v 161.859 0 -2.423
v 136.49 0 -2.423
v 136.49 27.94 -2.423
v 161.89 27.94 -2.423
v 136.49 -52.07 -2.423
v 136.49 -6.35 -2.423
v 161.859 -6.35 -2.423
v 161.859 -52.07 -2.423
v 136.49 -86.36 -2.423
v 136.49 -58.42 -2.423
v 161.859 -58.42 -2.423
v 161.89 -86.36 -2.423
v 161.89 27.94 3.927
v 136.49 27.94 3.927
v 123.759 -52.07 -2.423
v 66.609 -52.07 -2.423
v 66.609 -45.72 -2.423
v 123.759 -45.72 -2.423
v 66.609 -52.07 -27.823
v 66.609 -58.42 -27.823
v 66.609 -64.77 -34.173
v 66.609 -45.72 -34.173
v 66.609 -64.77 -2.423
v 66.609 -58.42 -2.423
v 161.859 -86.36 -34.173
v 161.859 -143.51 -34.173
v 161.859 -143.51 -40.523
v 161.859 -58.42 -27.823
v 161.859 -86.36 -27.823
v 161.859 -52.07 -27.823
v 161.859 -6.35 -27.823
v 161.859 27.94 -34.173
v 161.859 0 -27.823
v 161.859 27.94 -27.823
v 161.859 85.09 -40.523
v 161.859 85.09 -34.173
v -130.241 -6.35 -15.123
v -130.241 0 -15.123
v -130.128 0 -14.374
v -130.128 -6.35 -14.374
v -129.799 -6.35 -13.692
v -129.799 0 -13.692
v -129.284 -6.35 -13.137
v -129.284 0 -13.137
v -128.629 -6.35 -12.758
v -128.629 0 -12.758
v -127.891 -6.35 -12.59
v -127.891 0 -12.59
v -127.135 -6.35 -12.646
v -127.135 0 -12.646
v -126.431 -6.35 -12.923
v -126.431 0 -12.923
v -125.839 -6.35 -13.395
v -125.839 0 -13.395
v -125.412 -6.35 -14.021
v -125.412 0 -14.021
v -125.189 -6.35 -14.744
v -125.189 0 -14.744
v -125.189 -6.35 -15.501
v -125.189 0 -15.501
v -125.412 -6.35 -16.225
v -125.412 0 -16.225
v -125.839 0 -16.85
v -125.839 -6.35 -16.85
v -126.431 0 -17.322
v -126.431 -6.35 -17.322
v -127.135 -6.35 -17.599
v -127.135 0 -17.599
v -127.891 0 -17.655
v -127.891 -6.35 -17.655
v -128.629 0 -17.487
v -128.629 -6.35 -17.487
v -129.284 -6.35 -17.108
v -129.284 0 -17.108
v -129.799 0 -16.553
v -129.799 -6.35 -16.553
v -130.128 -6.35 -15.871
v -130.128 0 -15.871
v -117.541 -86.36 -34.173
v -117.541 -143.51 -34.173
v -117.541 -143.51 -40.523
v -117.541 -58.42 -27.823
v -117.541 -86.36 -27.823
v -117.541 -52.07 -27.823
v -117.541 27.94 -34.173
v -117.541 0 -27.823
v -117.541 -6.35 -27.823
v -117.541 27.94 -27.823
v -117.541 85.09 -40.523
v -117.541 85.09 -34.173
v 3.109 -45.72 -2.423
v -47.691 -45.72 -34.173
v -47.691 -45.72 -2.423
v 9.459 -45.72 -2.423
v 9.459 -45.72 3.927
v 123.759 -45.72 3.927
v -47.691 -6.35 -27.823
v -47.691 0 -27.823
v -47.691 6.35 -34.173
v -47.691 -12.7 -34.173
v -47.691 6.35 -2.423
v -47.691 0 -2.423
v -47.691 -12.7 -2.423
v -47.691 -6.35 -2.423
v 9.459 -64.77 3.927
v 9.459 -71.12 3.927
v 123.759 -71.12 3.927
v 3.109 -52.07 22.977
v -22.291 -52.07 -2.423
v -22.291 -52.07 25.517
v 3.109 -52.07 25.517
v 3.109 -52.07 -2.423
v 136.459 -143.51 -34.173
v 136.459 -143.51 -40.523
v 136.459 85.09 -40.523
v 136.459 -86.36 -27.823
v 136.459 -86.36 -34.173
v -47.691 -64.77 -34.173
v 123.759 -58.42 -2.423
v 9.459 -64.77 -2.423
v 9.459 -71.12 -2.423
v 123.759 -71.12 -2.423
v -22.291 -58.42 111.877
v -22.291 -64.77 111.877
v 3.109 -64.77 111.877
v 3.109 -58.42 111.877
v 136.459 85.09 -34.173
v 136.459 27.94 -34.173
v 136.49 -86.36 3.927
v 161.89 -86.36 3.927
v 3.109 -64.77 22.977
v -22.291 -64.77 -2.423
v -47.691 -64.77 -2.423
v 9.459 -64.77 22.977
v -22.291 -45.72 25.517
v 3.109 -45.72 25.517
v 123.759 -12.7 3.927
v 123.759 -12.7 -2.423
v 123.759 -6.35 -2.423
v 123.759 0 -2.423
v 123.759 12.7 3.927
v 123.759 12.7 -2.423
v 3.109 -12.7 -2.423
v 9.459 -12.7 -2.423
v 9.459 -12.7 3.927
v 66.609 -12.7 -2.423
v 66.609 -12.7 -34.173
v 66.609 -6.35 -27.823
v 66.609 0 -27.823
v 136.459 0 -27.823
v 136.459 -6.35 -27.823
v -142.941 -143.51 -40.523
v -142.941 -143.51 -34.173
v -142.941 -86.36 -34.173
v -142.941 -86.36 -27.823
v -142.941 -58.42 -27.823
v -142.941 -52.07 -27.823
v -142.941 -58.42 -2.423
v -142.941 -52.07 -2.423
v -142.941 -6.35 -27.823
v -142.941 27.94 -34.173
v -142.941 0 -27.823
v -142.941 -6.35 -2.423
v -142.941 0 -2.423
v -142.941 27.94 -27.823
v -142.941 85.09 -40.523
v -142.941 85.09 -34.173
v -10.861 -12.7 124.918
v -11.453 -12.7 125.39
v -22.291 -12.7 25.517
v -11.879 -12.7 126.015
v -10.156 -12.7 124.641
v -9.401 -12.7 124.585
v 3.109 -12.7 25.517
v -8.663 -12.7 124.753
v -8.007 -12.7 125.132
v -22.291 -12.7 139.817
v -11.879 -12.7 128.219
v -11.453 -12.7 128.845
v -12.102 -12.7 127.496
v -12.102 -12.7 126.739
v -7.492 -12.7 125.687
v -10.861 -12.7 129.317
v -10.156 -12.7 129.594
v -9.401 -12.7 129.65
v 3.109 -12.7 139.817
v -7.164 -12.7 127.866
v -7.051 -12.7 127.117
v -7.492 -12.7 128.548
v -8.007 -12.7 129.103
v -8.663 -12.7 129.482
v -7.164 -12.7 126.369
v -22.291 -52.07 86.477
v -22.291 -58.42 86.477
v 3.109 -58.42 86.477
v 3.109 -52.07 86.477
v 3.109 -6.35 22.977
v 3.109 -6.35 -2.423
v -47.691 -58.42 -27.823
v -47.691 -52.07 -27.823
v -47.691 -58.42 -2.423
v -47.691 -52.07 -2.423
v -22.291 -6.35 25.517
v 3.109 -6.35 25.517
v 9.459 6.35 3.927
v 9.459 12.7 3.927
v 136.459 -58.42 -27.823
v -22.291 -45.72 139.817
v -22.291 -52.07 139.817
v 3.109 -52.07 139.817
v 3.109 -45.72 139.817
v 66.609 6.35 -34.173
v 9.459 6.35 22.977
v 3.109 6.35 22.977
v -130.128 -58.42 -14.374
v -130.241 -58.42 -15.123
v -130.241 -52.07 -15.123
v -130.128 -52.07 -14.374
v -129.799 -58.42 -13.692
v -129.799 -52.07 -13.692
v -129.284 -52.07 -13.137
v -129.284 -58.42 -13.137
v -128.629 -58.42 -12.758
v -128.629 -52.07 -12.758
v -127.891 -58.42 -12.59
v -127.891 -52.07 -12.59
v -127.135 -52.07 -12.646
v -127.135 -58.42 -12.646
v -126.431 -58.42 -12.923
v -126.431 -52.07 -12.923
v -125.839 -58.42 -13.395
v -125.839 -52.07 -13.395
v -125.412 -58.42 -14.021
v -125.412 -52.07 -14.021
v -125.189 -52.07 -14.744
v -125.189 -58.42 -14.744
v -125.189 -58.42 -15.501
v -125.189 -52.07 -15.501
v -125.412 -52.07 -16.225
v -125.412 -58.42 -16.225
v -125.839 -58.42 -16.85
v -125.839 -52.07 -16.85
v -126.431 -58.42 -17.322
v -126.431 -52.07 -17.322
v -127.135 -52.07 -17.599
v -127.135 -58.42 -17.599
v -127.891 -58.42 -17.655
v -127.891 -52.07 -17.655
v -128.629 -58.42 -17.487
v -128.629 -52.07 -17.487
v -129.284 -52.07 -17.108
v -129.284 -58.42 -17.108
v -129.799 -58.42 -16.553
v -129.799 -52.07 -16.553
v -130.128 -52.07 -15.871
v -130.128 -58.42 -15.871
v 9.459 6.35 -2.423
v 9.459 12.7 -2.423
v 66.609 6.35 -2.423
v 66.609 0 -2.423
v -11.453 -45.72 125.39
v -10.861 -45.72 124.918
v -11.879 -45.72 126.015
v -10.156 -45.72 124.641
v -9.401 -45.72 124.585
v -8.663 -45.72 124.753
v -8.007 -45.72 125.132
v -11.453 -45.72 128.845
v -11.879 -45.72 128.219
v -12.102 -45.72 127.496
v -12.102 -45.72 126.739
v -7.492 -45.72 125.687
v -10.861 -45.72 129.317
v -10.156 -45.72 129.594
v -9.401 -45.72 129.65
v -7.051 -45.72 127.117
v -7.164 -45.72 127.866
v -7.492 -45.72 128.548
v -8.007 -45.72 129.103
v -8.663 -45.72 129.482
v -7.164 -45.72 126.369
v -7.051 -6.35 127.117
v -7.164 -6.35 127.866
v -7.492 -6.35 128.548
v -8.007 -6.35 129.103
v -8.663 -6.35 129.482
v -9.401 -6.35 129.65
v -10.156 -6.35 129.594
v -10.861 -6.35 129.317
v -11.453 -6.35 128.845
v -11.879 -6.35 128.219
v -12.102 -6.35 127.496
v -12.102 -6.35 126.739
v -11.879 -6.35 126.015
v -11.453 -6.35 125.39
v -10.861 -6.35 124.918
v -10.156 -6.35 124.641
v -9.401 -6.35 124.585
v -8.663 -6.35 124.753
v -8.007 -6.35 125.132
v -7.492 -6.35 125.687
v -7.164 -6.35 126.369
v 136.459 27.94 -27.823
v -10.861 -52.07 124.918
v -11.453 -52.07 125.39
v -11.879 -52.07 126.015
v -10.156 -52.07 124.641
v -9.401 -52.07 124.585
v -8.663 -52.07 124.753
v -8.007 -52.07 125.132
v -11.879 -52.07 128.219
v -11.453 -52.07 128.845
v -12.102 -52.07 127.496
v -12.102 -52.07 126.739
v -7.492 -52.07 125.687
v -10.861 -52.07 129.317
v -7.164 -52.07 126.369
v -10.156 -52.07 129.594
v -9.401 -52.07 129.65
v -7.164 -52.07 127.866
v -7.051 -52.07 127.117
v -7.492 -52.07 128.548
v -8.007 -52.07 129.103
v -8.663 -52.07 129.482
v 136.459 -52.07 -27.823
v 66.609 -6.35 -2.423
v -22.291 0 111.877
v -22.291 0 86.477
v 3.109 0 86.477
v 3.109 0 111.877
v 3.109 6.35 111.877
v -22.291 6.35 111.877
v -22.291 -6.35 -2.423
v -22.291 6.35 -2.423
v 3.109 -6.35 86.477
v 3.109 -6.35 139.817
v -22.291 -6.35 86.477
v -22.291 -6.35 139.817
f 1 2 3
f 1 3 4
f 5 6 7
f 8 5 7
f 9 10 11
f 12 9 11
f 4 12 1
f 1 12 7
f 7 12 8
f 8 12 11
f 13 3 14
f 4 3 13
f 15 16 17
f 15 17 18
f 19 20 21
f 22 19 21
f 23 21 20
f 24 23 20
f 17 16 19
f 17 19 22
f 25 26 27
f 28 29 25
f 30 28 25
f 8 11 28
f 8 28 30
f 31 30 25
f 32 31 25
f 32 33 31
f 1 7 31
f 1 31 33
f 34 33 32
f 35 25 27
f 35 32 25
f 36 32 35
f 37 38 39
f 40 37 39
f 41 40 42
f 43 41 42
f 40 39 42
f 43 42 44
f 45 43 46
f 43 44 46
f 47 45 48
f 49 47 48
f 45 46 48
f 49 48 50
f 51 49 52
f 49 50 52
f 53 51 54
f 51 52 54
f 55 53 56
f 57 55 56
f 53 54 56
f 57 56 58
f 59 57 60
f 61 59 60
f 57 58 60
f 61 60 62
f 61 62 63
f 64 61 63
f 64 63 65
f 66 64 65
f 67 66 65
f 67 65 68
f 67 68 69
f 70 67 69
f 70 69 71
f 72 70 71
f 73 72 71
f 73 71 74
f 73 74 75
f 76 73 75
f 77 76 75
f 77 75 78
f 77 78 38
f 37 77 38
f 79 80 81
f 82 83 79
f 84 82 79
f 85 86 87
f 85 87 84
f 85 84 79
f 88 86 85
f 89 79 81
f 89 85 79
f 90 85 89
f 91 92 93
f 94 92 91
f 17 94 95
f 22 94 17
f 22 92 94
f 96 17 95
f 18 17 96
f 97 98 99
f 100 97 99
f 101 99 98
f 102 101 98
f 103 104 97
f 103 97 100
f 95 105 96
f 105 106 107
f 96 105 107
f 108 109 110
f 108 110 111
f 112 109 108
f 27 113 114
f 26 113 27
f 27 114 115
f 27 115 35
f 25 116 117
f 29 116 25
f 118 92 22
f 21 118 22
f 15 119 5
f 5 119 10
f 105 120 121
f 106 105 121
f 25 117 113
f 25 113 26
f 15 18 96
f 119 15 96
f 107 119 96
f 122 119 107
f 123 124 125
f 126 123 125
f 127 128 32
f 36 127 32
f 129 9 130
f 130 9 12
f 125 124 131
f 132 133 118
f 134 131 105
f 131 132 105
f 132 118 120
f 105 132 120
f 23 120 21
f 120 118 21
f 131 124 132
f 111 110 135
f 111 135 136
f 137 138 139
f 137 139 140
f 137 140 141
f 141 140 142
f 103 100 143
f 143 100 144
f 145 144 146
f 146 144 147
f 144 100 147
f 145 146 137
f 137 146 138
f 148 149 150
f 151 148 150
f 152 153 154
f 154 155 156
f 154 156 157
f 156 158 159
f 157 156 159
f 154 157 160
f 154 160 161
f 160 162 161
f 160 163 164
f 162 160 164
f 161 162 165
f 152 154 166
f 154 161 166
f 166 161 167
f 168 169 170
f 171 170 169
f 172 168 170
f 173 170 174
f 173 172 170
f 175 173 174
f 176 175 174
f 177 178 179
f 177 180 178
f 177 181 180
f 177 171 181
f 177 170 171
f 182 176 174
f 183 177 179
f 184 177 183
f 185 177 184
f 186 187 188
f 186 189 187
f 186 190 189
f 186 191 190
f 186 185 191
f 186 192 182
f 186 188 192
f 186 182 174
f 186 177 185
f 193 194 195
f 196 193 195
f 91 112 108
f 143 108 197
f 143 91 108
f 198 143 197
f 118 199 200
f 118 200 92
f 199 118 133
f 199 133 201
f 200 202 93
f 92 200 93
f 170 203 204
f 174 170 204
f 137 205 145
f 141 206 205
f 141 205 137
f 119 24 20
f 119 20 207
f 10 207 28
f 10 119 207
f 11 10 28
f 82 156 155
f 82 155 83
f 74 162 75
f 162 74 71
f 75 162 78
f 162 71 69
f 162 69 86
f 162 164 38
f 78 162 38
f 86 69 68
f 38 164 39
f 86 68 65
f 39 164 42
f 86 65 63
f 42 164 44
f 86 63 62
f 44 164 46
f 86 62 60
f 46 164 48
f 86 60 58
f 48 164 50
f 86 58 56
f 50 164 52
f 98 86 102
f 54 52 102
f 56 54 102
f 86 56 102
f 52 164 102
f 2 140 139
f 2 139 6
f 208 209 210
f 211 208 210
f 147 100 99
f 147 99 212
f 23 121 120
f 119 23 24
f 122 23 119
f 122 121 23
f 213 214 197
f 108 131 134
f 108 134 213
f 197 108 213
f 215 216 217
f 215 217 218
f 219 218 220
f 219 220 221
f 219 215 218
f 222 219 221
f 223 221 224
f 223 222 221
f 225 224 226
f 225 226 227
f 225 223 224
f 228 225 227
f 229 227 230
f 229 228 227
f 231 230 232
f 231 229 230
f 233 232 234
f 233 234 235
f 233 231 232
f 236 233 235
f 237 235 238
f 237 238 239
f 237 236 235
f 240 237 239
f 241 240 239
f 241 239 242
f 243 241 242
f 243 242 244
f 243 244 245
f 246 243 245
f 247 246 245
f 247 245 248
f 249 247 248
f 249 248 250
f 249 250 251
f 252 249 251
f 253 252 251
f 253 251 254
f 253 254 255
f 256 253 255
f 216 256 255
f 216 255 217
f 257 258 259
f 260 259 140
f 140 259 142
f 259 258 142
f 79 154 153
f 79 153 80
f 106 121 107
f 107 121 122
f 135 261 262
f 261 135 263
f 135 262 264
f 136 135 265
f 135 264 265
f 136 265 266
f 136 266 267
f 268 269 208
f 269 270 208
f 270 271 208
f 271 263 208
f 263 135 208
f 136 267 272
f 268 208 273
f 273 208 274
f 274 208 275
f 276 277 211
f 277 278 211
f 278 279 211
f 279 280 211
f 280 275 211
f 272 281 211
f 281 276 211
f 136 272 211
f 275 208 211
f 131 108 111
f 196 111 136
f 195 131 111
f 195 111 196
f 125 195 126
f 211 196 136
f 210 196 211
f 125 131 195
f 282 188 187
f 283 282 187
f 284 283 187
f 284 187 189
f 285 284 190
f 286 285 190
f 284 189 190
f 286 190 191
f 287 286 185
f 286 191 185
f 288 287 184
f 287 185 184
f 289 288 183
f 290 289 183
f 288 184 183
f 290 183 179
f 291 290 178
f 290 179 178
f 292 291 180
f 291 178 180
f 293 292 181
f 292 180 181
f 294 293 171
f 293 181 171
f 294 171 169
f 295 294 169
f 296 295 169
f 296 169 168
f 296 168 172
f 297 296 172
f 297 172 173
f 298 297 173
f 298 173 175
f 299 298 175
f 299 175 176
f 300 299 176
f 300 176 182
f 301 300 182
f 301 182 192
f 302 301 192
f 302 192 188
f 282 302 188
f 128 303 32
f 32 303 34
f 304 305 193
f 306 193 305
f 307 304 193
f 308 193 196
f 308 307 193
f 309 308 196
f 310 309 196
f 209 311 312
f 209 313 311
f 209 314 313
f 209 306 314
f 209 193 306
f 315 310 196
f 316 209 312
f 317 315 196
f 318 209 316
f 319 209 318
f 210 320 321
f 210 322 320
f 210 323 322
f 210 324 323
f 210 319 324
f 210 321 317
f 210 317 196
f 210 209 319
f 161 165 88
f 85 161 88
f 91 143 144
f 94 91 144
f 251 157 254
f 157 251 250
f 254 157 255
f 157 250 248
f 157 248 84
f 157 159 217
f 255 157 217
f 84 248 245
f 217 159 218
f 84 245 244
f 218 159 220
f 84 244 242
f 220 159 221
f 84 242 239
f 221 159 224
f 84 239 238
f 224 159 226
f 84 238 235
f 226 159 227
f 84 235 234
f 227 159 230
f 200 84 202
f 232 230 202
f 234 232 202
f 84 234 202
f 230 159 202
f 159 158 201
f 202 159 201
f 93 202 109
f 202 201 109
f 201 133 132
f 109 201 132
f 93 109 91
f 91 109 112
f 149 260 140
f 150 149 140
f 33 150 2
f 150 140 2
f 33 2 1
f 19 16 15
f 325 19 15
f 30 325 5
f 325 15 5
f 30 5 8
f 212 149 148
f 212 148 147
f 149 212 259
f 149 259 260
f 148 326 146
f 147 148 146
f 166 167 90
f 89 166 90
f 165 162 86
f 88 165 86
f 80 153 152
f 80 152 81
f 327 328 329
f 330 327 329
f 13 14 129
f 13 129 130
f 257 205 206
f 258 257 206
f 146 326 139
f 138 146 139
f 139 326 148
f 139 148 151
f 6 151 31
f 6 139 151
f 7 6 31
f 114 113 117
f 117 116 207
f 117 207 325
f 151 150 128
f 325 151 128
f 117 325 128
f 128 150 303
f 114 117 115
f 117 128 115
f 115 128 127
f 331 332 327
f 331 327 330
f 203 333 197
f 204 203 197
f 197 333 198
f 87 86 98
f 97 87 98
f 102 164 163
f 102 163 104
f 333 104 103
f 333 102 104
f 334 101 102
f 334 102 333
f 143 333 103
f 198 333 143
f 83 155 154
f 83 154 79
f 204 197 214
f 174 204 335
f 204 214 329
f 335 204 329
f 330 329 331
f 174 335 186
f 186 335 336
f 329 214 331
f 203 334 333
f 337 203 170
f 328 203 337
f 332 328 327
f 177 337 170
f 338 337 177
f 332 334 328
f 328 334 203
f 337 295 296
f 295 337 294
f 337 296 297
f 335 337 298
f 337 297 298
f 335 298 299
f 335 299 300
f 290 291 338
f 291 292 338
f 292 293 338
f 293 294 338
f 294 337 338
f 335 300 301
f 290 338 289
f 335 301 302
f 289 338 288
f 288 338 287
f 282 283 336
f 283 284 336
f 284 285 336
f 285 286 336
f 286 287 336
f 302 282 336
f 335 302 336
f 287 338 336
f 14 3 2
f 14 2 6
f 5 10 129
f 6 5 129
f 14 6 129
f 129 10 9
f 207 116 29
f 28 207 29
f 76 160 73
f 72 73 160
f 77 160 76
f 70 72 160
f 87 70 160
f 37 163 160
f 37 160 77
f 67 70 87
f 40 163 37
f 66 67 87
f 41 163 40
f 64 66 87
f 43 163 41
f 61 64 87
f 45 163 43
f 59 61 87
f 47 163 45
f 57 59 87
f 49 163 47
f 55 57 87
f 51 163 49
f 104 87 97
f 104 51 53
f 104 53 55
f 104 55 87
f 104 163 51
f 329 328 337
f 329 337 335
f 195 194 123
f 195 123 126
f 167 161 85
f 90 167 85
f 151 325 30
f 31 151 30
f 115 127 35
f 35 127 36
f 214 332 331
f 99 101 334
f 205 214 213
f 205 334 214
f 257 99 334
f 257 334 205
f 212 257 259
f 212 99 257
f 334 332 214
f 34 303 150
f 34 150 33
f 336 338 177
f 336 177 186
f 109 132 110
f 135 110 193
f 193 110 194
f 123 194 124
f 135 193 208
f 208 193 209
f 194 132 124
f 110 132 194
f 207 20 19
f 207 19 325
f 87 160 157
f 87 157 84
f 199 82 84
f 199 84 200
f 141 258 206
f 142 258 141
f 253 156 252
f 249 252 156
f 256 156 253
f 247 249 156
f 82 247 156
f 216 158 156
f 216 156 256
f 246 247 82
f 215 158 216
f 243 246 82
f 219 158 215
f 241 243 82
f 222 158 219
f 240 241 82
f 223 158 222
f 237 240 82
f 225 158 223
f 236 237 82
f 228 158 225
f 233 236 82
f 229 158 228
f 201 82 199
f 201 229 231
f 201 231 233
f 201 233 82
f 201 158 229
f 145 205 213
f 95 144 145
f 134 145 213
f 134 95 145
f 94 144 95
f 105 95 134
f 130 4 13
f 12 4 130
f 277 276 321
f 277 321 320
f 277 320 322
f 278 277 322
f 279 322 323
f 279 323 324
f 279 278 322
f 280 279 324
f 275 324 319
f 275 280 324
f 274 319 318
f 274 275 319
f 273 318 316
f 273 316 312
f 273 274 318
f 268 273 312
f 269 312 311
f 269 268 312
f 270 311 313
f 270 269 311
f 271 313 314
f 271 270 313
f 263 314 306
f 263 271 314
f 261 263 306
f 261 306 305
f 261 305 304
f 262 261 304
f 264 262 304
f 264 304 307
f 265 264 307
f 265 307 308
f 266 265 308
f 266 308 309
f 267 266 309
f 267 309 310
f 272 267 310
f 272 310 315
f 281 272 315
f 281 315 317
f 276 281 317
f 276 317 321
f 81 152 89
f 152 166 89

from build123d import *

# Parameters (mm, degrees)
F0_W      = 304.8
F0_H      = 25.4
F1_DEPTH  = 6.35
F2_W      = 114.3
F2_H      = 25.4
F3_DEPTH  = 6.35
F4_W      = 114.3
F4_H      = 25.4
F5_DEPTH  = 6.35
F7_D      = 5.08
F8_W      = 114.3
F8_H      = 19.05
F9_DEPTH  = 6.35
F10_W     = 25.4
F10_H     = 57.15
F11_DEPTH = 6.35
F12_W     = 25.4
F12_H     = 114.3
F13_DEPTH = 6.35
F14_W     = 25.4
F14_H     = 57.15
F15_DEPTH = 6.35
F16_W     = 25.4
F16_H     = 114.3
F17_DEPTH = 6.35
F18_W     = 25.4
F18_H     = 57.15
F19_DEPTH = 6.35
F20_W     = 6.35
F20_H     = 57.15
F21_DEPTH = 25.4
F22_W     = 114.3
F22_H     = 25.4
F23_DEPTH = 6.35
F24_W     = 25.4
F24_H     = 6.35
F25_DEPTH = 88.9
F26_W     = 25.4
F26_H     = 6.35
F27_DEPTH = 114.3
F28_W     = 25.4
F28_H     = 114.3
F29_DEPTH = 6.35
F31_D     = 5.08


with BuildPart() as f1:
    # F0 (on Front) → F1 (new body)
    with BuildSketch(Plane.XZ):
        with Locations((9.459311, -15.122586)):
            Rectangle(F0_W, F0_H)
    extrude(amount=F1_DEPTH)

    # F2 (on face) → F3 (join)
    with BuildSketch(Plane.XZ.offset(6.35)):
        with Locations((9.459311, -15.122586)):
            Rectangle(F2_W, F2_H)
    extrude(amount=F3_DEPTH)

    # F4 (on face) → F5 (join)
    with BuildSketch(Plane(origin=(0, 0, 0), x_dir=(-1, 0, 0), z_dir=(0, 1, 0))):
        with Locations((-9.459311, -15.122586)):
            Rectangle(F4_W, F4_H)
    extrude(amount=F5_DEPTH)

    # F7 (through all)
    with Locations(Plane.XZ.offset(6.35)):
        with Locations((-127.700689, -15.122586)):
            Hole(F7_D / 2)

    # F8 (on face) → F9 (join)
    with BuildSketch(Plane(origin=(0, 0, -27.822586), x_dir=(1, 0, 0), z_dir=(0, 0, -1))):
        with Locations((9.459311, 3.175)):
            Rectangle(F8_W, F8_H)
    extrude(amount=F9_DEPTH)

    # F10 (on face) → F11 (join)
    with BuildSketch(Plane(origin=(0, 0, -27.822586), x_dir=(1, 0, 0), z_dir=(0, 0, -1))):
        with Locations((-130.240689, 0.635)):
            Rectangle(F10_W, F10_H)
    extrude(amount=F11_DEPTH)

    # F12 (on face) → F13 (join)
    with BuildSketch(Plane(origin=(0, 0, -34.172586), x_dir=(1, 0, 0), z_dir=(0, 0, -1))):
        with Locations((-130.240689, -27.94)):
            Rectangle(F12_W, F12_H)
    extrude(amount=F13_DEPTH)

    # F14 (on face) → F15 (join)
    with BuildSketch(Plane(origin=(0, 0, -27.822586), x_dir=(1, 0, 0), z_dir=(0, 0, -1))):
        with Locations((149.159311, 0.635)):
            Rectangle(F14_W, F14_H)
    extrude(amount=F15_DEPTH)

    # F16 (on face) → F17 (join)
    with BuildSketch(Plane(origin=(0, 0, -34.172586), x_dir=(1, 0, 0), z_dir=(0, 0, -1))):
        with Locations((149.159311, -27.94)):
            Rectangle(F16_W, F16_H)
    extrude(amount=F17_DEPTH)

    # F18 (on face) → F19 (join)
    with BuildSketch(Plane.XY.offset(-2.422586)):
        with Locations((149.190135, -0.635)):
            Rectangle(F18_W, F18_H)
    extrude(amount=F19_DEPTH)

    # F20 (on face) → F21 (join)
    with BuildSketch(Plane.XY.offset(-2.422586)):
        with Locations((6.284311, -22.225)):
            Rectangle(F20_W, F20_H)
    extrude(amount=F21_DEPTH)

    # F22 (on face) → F23 (join)
    with BuildSketch(Plane.XY.offset(-2.422586)):
        with Locations((66.609311, 0)):
            Rectangle(F22_W, F22_H)
    extrude(amount=F23_DEPTH)

    # F24 (on face) → F25 (join)
    with BuildSketch(Plane.XY.offset(-2.422586)):
        with Locations((-9.590689, -3.175)):
            Rectangle(F24_W, F24_H)
    extrude(amount=F25_DEPTH)

    # F26 (on face) → F27 (join)
    with BuildSketch(Plane.XY.offset(-2.422586)):
        with Locations((-9.590689, 3.175)):
            Rectangle(F26_W, F26_H)
    extrude(amount=F27_DEPTH)

    # F28 (on face) → F29 (join)
    with BuildSketch(Plane.XZ.offset(6.35)):
        with Locations((-9.590689, 82.667414)):
            Rectangle(F28_W, F28_H)
    extrude(amount=F29_DEPTH)

    # F31 (through all)
    with Locations(Plane(origin=(0, -6.35, 0), x_dir=(-1, 0, 0), z_dir=(0, 1, 0))):
        with Locations((9.590689, 127.117414)):
            Hole(F31_D / 2)

    # F32: F1 across face


with BuildPart() as f1_1:
    add(f1.part)
    add(f1.part.mirror(Plane(origin=(-130.240689, -29.21, -34.172586), x_dir=(1, 0, 0), z_dir=(0, -1, 0))))


solid = f1_1.part
